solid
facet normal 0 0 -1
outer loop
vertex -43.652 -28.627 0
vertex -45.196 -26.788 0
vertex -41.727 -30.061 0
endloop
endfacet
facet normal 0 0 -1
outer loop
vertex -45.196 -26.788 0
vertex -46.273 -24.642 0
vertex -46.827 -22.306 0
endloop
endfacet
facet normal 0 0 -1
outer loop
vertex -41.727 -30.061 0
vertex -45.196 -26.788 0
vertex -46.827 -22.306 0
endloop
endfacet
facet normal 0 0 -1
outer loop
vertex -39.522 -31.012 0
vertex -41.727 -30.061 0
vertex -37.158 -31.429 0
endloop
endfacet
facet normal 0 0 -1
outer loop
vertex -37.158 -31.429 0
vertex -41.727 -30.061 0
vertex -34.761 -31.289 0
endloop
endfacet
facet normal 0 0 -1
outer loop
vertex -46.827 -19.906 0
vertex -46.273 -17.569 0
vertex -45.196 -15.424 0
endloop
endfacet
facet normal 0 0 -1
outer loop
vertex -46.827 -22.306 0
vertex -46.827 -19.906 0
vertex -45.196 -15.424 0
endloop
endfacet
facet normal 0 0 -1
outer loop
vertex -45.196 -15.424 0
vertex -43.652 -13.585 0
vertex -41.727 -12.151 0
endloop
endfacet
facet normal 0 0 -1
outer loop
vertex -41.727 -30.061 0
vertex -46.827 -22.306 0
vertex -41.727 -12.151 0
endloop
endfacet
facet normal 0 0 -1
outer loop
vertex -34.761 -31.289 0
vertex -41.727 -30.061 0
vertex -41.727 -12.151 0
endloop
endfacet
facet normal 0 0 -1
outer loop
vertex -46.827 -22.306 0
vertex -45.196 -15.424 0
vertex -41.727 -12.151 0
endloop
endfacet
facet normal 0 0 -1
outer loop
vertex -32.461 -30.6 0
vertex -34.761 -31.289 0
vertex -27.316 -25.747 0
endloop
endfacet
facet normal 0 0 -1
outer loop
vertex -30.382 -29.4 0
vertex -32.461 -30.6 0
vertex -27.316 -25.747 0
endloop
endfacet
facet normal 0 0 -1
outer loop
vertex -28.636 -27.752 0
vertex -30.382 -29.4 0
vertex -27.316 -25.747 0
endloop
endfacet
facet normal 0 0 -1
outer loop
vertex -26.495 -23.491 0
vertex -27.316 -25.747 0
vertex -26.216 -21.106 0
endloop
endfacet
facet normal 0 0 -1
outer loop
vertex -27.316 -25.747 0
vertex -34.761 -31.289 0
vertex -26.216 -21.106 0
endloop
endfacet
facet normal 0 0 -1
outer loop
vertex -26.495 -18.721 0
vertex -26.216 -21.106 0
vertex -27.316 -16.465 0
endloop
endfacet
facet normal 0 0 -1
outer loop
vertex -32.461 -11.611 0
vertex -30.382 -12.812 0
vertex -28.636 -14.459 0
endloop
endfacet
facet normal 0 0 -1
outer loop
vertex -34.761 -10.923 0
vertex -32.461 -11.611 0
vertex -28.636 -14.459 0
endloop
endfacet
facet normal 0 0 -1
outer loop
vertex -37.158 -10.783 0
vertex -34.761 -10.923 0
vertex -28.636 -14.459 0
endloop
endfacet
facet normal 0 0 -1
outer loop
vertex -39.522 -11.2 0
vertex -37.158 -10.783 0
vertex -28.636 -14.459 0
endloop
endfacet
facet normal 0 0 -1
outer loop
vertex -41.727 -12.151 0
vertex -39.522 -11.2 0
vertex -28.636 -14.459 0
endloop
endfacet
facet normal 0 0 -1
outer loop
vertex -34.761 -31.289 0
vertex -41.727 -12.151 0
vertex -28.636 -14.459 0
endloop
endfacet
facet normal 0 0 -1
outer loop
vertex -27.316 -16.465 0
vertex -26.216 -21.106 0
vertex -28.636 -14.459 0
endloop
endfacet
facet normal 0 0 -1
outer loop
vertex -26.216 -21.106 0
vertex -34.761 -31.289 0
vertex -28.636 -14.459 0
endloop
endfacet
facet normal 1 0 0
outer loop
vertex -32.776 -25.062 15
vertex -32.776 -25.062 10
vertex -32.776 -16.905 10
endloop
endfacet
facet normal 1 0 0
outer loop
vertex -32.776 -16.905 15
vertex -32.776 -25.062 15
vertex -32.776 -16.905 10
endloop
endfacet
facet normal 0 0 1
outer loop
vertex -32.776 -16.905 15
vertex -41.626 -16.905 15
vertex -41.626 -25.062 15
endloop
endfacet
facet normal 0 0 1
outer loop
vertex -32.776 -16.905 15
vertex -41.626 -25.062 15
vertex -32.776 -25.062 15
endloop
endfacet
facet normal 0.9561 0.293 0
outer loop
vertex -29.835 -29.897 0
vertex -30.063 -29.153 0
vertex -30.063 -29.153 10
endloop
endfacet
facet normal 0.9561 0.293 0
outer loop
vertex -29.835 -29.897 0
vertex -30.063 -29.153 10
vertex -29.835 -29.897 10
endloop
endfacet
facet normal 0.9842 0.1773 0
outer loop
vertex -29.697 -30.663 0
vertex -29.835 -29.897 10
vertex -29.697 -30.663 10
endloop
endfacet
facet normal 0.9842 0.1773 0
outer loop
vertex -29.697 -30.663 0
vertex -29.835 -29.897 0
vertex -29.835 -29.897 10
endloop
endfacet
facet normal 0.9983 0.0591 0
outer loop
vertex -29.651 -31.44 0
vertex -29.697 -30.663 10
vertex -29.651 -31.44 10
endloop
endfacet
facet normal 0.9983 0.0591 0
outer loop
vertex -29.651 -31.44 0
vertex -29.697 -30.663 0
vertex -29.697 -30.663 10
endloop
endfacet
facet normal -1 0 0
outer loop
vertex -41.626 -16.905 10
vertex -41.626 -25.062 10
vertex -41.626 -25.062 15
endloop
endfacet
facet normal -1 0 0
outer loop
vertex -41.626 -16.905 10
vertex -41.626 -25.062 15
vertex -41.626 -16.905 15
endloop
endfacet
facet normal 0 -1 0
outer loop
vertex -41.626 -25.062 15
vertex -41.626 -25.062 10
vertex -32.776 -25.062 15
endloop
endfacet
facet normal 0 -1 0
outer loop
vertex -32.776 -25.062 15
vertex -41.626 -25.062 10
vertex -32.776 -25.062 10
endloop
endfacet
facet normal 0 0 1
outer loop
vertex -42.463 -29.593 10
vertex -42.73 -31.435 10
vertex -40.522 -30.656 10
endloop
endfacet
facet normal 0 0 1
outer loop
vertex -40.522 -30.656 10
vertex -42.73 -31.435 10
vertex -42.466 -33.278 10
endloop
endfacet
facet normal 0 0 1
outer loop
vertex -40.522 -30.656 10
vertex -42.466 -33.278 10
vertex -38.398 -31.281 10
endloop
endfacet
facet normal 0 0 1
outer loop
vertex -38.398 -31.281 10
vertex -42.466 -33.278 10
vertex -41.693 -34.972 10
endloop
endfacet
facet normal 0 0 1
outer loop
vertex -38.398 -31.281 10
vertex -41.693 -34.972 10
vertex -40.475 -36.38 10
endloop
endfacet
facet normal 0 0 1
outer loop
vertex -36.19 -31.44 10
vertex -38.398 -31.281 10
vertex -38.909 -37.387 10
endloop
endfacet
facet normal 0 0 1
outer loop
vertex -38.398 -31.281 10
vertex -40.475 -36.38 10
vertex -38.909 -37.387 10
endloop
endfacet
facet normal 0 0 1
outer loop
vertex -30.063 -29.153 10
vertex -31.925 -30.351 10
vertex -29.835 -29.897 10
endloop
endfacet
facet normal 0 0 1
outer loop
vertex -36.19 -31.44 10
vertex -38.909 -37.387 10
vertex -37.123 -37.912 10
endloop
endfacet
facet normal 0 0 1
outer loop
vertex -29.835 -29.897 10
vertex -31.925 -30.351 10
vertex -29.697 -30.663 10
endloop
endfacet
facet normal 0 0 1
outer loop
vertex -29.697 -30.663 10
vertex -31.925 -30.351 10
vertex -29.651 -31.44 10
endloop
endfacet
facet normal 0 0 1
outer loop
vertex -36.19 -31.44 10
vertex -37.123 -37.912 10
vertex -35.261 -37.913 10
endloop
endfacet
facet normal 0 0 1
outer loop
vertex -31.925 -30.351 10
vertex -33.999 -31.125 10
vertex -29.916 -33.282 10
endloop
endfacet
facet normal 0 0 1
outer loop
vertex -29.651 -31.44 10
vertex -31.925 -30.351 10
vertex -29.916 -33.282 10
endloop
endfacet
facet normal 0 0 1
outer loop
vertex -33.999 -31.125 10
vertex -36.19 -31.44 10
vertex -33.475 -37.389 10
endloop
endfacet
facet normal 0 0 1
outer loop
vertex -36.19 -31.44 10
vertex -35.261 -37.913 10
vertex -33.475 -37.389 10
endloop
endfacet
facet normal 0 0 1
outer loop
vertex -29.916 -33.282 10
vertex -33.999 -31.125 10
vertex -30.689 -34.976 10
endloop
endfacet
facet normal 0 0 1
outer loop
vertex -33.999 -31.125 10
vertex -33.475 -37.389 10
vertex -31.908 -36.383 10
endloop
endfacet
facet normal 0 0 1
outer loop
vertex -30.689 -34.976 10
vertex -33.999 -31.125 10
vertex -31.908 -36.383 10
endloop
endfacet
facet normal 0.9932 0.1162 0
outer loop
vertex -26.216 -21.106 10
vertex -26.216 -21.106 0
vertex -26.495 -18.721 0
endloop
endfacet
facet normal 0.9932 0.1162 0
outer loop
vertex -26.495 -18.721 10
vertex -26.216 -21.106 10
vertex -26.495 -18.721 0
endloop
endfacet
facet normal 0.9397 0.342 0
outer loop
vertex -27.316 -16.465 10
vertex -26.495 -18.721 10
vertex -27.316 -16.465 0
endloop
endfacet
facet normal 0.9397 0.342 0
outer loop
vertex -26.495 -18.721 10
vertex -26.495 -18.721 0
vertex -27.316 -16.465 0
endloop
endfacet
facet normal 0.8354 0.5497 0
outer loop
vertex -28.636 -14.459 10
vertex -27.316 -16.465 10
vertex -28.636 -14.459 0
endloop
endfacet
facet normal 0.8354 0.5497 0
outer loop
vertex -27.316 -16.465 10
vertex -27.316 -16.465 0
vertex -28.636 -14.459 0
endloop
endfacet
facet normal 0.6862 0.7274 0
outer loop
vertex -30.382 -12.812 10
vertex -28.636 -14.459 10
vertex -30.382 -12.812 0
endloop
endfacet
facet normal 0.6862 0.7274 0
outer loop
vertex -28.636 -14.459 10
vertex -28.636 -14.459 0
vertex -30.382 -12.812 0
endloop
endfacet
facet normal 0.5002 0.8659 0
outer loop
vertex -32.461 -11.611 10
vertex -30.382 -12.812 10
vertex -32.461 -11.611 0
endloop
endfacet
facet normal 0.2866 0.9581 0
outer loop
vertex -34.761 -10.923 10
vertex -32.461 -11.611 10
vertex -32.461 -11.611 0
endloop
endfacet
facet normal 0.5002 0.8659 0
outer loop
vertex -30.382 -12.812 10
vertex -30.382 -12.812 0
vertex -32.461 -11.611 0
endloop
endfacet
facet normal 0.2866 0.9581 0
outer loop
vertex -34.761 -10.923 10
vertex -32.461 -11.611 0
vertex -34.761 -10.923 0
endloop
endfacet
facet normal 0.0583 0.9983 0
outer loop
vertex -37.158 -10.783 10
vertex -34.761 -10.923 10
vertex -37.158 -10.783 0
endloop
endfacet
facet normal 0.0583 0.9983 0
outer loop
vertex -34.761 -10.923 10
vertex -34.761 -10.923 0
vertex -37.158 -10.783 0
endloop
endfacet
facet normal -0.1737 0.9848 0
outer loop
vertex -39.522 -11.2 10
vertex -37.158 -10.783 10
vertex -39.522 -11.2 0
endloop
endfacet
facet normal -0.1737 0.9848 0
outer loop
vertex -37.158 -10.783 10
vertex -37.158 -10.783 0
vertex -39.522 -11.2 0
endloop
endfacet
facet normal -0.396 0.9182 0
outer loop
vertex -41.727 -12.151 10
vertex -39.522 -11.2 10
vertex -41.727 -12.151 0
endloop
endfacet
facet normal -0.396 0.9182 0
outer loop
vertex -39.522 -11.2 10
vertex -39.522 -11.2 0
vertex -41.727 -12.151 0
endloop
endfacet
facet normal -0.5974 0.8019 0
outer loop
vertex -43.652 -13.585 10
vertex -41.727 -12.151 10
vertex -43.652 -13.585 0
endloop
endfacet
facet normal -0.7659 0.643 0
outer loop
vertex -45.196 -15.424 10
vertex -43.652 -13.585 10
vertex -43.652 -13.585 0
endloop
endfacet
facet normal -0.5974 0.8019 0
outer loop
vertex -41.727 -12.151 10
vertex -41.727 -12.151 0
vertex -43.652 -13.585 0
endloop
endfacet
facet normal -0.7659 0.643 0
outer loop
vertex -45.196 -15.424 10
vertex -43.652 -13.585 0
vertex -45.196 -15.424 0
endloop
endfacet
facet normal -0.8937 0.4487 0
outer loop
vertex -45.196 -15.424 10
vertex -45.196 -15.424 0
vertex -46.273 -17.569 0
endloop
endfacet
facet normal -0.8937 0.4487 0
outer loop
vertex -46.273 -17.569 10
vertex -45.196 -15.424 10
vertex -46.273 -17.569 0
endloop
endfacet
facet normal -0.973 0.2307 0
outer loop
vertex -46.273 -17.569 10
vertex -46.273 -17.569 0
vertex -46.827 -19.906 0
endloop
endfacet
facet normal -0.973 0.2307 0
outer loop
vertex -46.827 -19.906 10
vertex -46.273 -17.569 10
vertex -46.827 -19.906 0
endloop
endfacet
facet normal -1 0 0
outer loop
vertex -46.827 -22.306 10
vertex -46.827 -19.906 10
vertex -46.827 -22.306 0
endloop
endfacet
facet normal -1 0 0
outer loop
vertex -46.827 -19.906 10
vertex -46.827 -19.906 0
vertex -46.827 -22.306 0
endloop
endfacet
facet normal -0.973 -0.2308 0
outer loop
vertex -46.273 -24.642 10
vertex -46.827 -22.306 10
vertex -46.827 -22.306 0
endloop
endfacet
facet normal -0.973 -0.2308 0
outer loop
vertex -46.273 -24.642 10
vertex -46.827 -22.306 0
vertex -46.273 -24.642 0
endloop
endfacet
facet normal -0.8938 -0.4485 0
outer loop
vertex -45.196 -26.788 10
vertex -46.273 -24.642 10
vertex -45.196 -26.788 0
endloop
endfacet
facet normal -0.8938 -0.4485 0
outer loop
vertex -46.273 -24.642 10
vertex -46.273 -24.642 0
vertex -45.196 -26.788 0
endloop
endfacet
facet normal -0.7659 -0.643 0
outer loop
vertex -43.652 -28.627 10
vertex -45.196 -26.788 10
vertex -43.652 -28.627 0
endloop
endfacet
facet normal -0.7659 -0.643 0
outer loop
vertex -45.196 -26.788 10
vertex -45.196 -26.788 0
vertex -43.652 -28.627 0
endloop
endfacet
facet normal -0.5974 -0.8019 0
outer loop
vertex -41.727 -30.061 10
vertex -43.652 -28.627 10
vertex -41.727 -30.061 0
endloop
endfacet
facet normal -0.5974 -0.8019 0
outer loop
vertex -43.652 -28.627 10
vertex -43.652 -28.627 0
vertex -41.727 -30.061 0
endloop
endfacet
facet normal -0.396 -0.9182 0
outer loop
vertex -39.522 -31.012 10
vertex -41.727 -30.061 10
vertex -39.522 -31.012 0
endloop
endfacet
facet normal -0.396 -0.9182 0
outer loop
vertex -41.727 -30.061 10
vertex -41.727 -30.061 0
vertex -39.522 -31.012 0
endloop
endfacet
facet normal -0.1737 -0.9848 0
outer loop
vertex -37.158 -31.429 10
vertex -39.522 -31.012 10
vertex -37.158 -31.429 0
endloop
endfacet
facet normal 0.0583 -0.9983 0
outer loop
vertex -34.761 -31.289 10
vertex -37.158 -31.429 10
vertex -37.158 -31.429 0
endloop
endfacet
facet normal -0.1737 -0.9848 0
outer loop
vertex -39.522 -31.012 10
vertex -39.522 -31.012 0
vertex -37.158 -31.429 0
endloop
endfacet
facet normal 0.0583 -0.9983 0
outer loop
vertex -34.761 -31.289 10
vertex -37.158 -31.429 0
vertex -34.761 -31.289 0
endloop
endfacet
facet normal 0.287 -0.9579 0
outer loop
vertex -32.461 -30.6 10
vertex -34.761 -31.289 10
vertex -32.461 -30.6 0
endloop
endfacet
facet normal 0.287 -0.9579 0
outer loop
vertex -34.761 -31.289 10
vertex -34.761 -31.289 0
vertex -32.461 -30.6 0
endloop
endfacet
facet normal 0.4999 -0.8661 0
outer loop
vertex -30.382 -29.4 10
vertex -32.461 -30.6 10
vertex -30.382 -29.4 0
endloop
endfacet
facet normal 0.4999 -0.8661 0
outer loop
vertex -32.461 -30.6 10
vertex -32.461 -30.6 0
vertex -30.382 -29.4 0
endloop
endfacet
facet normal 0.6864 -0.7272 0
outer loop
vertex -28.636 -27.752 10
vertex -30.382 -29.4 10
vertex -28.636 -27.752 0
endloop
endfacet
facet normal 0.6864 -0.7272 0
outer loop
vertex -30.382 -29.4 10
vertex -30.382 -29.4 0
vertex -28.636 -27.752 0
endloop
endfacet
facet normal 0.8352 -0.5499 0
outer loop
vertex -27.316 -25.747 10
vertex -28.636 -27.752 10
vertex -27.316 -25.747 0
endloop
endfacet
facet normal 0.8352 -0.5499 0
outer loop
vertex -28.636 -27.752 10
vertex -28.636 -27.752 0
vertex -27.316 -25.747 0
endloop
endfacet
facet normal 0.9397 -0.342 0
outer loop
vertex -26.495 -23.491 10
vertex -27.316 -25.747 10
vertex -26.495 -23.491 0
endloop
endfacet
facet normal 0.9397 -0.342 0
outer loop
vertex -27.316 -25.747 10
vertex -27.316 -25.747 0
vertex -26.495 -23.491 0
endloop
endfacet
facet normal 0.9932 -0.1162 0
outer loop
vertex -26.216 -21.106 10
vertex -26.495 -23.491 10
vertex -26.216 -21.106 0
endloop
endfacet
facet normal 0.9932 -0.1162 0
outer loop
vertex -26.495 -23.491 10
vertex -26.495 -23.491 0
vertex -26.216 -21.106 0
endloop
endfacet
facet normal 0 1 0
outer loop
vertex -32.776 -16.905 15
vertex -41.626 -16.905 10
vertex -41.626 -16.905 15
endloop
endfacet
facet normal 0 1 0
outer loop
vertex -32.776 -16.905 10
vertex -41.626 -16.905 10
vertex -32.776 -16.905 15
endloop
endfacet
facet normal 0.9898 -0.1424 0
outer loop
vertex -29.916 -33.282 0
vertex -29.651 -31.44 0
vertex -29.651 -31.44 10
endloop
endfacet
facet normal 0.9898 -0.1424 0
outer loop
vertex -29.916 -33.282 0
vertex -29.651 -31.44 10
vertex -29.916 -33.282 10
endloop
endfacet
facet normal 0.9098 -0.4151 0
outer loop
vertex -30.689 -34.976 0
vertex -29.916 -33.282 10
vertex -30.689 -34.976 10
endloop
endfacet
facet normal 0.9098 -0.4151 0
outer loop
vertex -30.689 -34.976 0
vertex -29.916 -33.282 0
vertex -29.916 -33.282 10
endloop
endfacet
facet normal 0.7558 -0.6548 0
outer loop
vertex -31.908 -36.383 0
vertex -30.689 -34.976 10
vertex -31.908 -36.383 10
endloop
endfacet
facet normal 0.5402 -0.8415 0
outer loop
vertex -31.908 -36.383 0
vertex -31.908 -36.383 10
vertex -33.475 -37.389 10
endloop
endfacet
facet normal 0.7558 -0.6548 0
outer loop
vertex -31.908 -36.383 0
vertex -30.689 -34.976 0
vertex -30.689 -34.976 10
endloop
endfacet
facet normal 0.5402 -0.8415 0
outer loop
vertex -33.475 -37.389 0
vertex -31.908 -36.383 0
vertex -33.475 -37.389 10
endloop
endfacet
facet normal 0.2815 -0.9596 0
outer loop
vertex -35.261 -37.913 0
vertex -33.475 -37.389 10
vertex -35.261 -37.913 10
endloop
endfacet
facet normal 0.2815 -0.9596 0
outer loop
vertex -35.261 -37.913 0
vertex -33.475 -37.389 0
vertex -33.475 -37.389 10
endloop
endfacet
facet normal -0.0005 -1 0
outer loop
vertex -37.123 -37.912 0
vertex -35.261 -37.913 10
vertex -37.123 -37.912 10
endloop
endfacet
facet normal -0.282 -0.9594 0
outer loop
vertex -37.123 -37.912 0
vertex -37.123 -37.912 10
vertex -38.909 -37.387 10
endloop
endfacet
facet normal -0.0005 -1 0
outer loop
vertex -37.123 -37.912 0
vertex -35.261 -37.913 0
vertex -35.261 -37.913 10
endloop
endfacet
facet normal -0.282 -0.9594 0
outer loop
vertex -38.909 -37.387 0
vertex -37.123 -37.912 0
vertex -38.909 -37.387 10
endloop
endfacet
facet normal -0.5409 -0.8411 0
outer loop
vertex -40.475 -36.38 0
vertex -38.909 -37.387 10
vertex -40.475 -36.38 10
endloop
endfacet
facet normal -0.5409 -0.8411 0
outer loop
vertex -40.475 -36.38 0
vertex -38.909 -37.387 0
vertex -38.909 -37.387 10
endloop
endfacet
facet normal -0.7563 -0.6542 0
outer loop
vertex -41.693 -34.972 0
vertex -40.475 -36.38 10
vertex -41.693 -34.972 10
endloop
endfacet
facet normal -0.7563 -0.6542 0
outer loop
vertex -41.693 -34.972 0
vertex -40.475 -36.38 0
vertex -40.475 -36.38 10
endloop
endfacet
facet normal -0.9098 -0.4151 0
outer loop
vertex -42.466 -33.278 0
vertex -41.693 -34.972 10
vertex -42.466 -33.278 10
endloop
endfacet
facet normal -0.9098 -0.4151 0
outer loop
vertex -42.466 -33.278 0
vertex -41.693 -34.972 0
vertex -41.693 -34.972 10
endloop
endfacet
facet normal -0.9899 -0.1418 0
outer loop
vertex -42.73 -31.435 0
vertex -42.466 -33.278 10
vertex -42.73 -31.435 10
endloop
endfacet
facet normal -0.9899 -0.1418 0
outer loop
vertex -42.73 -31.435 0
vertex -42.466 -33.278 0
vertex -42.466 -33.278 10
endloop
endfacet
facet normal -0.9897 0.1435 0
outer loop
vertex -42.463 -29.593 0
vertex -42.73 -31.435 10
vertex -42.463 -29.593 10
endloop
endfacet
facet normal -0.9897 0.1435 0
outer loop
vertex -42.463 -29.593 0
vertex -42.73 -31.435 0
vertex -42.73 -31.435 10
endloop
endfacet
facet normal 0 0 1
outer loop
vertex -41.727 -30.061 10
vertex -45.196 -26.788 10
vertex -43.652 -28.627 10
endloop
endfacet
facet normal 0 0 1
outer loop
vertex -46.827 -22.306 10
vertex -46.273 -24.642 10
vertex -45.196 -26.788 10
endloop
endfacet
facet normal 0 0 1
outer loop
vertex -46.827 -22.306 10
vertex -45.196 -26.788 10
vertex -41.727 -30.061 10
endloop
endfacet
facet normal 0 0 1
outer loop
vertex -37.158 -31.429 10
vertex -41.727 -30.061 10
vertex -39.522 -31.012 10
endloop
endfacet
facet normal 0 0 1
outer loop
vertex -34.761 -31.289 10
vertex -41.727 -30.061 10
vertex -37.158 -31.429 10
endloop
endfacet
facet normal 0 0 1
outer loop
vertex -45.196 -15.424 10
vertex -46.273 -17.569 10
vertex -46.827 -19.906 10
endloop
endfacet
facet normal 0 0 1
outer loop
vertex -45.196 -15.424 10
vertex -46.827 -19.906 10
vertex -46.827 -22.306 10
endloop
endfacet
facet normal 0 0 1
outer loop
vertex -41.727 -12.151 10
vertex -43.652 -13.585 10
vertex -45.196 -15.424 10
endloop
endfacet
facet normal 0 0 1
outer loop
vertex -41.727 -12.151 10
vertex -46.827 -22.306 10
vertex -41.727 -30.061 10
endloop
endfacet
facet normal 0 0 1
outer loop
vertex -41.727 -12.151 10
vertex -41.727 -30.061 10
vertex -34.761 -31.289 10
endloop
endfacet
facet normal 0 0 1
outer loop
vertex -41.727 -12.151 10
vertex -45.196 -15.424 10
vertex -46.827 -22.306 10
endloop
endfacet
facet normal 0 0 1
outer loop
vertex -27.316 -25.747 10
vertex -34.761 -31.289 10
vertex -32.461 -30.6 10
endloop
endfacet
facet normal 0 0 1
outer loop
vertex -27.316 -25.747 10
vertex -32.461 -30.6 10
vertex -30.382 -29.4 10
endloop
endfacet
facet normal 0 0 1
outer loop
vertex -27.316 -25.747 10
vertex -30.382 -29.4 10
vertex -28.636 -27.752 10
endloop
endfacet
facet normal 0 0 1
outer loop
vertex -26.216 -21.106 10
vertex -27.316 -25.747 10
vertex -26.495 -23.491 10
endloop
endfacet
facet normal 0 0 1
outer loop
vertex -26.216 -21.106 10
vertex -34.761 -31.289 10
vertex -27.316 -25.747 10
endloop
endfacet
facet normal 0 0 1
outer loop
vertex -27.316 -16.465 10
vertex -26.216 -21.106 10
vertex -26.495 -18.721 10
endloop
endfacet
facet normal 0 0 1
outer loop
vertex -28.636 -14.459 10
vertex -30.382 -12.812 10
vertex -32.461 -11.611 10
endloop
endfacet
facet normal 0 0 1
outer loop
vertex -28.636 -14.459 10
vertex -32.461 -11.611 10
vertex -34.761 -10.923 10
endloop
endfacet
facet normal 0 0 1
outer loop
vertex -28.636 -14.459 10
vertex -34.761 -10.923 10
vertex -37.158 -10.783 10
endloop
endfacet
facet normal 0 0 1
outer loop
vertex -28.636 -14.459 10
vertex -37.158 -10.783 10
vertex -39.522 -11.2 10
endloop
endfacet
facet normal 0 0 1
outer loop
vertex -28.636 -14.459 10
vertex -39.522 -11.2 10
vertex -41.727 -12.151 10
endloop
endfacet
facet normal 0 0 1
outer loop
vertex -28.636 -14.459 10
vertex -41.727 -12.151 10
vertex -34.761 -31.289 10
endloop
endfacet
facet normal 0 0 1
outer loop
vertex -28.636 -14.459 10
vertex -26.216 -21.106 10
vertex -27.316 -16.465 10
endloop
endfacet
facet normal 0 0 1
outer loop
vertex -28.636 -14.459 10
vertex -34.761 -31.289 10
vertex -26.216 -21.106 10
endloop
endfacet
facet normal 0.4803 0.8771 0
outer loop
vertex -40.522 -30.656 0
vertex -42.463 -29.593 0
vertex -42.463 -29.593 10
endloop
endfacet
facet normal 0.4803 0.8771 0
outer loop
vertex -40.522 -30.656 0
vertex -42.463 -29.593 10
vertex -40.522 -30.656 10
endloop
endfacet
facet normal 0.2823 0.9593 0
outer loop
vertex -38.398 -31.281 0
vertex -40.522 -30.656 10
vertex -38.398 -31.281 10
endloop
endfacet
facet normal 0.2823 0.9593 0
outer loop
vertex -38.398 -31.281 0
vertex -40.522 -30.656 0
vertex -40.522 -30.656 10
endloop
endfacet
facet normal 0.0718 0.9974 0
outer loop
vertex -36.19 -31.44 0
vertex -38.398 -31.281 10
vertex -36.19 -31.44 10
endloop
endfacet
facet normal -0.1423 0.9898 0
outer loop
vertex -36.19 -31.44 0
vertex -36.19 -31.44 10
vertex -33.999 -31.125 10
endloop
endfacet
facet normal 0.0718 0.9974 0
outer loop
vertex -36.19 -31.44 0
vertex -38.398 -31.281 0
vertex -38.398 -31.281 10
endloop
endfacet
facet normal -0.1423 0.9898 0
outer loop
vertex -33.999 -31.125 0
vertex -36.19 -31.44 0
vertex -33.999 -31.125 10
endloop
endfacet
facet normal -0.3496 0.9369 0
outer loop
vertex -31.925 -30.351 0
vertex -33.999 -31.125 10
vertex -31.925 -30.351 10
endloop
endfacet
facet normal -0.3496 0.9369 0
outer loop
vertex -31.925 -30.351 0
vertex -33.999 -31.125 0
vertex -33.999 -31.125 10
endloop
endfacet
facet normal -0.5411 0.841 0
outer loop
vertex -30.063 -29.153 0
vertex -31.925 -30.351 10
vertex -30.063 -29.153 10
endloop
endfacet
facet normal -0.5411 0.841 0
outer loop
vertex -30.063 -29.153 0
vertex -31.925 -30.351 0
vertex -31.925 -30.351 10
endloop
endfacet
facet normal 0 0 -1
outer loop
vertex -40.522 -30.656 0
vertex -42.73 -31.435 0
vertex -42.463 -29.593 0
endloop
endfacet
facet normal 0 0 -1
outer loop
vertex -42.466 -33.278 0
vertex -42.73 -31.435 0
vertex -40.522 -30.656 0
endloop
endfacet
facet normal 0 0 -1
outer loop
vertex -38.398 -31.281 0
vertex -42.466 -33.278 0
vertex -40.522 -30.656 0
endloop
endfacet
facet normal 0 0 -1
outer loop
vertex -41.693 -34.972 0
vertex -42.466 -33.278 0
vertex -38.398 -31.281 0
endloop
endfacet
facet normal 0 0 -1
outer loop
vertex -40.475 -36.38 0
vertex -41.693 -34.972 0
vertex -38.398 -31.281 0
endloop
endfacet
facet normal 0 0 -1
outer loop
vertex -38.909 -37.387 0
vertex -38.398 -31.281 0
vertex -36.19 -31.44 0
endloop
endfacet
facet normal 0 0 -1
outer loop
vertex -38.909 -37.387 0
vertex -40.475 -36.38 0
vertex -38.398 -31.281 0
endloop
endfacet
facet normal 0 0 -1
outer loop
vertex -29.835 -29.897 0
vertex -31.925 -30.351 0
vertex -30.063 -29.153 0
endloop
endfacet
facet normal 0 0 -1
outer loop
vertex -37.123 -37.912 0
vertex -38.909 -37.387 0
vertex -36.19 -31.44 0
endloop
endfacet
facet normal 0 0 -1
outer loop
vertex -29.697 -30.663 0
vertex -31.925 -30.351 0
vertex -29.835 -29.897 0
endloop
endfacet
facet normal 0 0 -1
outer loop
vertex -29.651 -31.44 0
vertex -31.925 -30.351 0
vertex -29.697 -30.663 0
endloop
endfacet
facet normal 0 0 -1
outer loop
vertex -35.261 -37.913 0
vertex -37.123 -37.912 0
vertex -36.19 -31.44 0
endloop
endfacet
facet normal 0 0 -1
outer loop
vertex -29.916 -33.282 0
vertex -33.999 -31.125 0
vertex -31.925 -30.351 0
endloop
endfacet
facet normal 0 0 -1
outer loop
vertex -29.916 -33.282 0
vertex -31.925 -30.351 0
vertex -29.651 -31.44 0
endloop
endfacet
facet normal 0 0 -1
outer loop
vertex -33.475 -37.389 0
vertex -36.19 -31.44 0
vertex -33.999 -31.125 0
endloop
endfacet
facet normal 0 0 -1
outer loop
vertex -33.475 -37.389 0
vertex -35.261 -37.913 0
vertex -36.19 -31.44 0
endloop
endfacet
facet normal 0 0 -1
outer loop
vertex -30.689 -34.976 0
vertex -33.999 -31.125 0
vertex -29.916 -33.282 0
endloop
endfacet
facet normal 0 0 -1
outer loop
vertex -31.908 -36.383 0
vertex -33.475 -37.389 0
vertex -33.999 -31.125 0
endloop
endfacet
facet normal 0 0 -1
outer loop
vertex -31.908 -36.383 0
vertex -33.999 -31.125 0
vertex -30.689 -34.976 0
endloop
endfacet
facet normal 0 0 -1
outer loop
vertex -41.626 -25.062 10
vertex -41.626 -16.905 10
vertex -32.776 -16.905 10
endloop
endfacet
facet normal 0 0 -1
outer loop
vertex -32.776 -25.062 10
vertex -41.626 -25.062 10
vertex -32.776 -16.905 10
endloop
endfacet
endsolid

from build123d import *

# Parameters (mm, degrees)
F0_R     = 10.340195
F1_DEPTH = 10
F2_W     = 8.849814
F2_H     = 8.156959
F3_DEPTH = 5
F5_DEPTH = 10


with BuildPart() as f1:
    # F0 (on Top) → F1 (new body)
    with BuildSketch(Plane.XY):
        with Locations((-36.556564, -21.105945)):
            Circle(F0_R)
    extrude(amount=F1_DEPTH)


with BuildPart() as f3:
    # F2 (on face) → F3 (new body)
    with BuildSketch(Plane.XY.offset(10)):
        with Locations((-37.201073, -20.983216)):
            Rectangle(F2_W, F2_H)
    extrude(amount=F3_DEPTH)


with BuildPart() as f5:
    # F4 (on face) → F5 (new body)
    with BuildSketch(Plane(origin=(0, 0, 0), x_dir=(1, 0, 0), z_dir=(0, 0, -1))):
        with BuildLine():
            ThreePointArc((-30.06333, 29.153153), (-29.754594, 30.277921), (-29.650578, 31.439645))
            ThreePointArc((-29.650578, 31.439645), (-37.123024, 37.912286), (-42.463456, 29.592892))
            ThreePointArc((-42.463456, 29.592892), (-36.190106, 31.439645), (-30.06333, 29.153153))
        make_face()
    extrude(amount=-F5_DEPTH)


solid = Compound([f1.part, f3.part, f5.part])
